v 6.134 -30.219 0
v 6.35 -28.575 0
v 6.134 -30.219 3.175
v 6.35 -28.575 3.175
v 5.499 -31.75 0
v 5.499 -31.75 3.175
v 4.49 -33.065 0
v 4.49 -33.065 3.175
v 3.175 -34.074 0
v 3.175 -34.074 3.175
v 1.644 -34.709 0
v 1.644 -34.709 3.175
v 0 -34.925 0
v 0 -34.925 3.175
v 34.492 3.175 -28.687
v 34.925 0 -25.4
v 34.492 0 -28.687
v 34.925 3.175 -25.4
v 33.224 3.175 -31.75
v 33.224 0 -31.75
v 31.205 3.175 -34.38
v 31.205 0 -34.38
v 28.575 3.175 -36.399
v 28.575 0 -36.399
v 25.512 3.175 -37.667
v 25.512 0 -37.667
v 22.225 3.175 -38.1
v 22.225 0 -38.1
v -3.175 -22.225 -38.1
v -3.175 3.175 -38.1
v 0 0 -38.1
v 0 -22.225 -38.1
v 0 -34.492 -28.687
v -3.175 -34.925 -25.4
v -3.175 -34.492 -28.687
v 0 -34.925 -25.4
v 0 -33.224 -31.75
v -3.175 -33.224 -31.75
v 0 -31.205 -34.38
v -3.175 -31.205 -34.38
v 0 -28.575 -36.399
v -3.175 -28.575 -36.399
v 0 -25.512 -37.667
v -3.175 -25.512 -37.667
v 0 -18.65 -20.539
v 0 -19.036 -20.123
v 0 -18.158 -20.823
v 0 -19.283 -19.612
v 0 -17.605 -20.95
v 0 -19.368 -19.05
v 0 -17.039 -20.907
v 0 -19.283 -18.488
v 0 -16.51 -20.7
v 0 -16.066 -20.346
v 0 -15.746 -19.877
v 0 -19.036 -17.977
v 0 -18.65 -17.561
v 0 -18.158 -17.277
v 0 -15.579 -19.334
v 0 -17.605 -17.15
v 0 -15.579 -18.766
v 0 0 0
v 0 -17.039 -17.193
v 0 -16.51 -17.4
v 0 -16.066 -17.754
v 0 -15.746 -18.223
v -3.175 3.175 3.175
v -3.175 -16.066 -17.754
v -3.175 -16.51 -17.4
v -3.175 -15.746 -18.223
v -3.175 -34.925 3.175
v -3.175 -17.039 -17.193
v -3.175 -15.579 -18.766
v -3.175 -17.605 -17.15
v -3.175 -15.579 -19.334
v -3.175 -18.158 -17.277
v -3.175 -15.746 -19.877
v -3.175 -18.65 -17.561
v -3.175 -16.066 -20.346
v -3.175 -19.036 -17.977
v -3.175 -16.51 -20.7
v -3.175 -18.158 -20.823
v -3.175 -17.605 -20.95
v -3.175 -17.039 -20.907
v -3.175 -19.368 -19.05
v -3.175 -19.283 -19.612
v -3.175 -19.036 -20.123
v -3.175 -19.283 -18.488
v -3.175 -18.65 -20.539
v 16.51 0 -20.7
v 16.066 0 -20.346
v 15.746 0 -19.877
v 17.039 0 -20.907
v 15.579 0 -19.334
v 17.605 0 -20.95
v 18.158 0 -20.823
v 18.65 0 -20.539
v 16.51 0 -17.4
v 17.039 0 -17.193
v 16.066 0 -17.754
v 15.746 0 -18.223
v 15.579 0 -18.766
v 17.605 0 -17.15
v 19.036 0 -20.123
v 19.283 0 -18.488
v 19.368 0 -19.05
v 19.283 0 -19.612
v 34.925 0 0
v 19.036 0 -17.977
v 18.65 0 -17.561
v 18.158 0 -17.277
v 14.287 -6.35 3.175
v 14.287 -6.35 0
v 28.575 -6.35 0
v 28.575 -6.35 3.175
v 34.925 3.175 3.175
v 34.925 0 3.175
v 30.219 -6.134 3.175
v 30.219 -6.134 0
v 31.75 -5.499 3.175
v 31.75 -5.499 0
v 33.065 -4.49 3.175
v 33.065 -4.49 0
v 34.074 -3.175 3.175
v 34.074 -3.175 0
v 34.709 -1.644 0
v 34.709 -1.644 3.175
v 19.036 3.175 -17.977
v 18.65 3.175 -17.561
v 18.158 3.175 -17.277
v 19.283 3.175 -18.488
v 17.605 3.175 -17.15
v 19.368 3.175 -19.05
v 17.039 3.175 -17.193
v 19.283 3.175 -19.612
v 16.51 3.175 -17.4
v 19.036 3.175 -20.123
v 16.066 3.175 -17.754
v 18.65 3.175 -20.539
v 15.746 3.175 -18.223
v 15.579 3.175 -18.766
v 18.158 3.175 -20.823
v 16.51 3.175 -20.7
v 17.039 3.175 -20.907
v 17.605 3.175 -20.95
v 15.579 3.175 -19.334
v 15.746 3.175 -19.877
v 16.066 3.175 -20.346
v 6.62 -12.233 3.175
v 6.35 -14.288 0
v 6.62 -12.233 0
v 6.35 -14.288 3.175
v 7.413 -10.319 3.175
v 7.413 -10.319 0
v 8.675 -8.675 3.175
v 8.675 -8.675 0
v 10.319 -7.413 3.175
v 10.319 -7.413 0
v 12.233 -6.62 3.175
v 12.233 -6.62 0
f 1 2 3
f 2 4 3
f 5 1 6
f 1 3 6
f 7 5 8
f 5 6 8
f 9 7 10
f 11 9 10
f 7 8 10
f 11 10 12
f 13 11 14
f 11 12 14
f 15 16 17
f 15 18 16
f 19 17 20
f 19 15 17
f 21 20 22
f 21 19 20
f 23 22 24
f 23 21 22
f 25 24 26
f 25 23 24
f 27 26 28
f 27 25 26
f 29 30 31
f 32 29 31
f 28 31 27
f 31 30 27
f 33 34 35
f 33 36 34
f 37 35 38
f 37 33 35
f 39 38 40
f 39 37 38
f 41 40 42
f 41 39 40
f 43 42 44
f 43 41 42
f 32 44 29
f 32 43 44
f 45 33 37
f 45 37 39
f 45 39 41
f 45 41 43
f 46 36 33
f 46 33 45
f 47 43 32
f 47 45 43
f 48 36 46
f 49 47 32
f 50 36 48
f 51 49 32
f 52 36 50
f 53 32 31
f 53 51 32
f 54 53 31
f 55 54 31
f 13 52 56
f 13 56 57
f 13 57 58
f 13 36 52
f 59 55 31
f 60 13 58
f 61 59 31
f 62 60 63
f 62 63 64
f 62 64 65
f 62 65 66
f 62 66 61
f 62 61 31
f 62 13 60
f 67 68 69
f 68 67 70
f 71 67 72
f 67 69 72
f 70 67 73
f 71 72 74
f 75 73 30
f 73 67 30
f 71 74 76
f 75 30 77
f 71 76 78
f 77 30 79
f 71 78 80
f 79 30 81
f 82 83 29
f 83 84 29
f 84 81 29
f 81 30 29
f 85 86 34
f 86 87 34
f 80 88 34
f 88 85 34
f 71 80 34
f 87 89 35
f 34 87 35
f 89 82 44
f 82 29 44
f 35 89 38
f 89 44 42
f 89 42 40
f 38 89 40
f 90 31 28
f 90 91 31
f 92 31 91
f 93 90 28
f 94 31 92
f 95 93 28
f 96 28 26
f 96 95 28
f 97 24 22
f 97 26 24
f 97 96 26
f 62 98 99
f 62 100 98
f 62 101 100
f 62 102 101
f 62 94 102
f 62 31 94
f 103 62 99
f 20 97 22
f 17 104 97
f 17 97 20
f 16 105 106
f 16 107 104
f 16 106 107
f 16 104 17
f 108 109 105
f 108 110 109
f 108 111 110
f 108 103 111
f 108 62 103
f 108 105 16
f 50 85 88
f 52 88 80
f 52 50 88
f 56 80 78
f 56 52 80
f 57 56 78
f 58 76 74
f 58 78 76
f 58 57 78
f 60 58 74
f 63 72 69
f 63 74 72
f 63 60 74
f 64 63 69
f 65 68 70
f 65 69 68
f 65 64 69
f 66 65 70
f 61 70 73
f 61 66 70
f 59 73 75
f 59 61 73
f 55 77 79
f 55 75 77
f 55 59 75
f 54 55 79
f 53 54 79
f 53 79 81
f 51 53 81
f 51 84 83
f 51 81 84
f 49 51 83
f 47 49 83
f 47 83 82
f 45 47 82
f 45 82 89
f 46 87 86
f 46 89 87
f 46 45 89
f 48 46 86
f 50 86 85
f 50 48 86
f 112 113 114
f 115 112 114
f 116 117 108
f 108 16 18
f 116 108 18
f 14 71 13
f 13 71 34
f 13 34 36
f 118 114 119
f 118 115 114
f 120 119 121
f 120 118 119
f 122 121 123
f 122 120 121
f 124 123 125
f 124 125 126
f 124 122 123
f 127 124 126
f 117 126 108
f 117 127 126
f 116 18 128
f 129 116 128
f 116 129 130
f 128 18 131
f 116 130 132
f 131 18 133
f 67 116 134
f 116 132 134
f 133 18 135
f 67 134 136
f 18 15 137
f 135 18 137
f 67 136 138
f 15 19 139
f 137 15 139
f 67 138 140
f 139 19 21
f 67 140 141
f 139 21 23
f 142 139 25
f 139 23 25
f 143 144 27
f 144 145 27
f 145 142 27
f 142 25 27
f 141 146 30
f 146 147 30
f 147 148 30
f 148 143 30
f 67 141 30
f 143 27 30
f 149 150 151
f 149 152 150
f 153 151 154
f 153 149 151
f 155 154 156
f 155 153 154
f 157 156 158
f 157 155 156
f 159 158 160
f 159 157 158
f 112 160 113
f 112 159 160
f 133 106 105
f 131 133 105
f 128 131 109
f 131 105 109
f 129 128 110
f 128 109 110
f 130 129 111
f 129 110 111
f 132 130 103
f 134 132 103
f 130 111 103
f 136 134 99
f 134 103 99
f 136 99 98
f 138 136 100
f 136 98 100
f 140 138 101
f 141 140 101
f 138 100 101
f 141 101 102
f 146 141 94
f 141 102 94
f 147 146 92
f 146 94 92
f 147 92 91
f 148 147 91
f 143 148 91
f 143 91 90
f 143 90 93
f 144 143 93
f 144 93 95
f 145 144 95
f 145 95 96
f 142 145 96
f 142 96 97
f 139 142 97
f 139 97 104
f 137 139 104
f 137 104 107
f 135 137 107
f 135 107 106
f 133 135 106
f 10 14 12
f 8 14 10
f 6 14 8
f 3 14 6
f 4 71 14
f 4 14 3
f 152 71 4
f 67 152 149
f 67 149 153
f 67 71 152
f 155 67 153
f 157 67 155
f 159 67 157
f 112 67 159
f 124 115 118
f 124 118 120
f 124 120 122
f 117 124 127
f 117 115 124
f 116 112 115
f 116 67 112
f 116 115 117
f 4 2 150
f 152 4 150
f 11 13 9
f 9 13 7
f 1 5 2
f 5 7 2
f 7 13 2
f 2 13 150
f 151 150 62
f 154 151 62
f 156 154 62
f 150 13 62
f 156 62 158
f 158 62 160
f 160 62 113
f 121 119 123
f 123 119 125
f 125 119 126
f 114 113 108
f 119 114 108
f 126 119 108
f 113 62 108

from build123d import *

# Parameters (mm, degrees)
F1_DEPTH  = 38.1
F3_DEPTH  = 3.175
F4_R      = 7.9375
F5_R      = 6.35
F9_R      = 12.7
F10_R     = 1.905
F11_DEPTH = 3.176


# Not quite as in the source:
# - a pattern or mirror of a feature is missing from the dataset's text; its kind, count and spacing are read off the source's solid


with BuildPart() as f1:
    # F0 (on Top) → F1 (new body)
    with BuildSketch(Plane.XY):
        Polygon((0, -34.925), (0, 0), (34.925, 0), (34.925, 3.175), (-3.175, 3.175), (-3.175, -34.925), align=None)
    extrude(amount=-F1_DEPTH)

    # F2 (on face) → F3 (join)
    with BuildSketch(Plane.XY):
        Polygon((6.35, -34.925), (6.35, -6.35), (34.925, -6.35), (34.925, 3.175), (-3.175, 3.175), (-3.175, -34.925), align=None)
    extrude(amount=F3_DEPTH)

    # F4
    f4_edges = [f1.edges().sort_by_distance(p)[0] for p in [
        (6.35, -6.35, 1.5875),
    ]]
    fillet(f4_edges, radius=F4_R)

    # F5
    f5_edges = [f1.edges().sort_by_distance(p)[0] for p in [
        (6.35, -34.925, 1.5875),
        (34.925, -6.35, 1.5875),
    ]]
    fillet(f5_edges, radius=F5_R)

    # F9
    f9_edges = [f1.edges().sort_by_distance(p)[0] for p in [
        (34.925, 1.5875, -38.1),
        (-1.5875, -34.925, -38.1),
    ]]
    fillet(f9_edges, radius=F9_R)

    # F10 (on face) → F11 (cut, through all)
    with BuildSketch(Plane.XZ):
        with Locations((17.4625, -19.05)):
            Circle(F10_R)
    f11 = extrude(amount=-F11_DEPTH, mode=Mode.SUBTRACT)

    # F11_copies: F11 across plane
    add(f11.mirror(Plane(origin=(0, 0, 0), x_dir=(0.7071067812, -0.7071067812, 0), z_dir=(-0.7071067812, -0.7071067812, 0))), mode=Mode.SUBTRACT)


solid = f1.part
